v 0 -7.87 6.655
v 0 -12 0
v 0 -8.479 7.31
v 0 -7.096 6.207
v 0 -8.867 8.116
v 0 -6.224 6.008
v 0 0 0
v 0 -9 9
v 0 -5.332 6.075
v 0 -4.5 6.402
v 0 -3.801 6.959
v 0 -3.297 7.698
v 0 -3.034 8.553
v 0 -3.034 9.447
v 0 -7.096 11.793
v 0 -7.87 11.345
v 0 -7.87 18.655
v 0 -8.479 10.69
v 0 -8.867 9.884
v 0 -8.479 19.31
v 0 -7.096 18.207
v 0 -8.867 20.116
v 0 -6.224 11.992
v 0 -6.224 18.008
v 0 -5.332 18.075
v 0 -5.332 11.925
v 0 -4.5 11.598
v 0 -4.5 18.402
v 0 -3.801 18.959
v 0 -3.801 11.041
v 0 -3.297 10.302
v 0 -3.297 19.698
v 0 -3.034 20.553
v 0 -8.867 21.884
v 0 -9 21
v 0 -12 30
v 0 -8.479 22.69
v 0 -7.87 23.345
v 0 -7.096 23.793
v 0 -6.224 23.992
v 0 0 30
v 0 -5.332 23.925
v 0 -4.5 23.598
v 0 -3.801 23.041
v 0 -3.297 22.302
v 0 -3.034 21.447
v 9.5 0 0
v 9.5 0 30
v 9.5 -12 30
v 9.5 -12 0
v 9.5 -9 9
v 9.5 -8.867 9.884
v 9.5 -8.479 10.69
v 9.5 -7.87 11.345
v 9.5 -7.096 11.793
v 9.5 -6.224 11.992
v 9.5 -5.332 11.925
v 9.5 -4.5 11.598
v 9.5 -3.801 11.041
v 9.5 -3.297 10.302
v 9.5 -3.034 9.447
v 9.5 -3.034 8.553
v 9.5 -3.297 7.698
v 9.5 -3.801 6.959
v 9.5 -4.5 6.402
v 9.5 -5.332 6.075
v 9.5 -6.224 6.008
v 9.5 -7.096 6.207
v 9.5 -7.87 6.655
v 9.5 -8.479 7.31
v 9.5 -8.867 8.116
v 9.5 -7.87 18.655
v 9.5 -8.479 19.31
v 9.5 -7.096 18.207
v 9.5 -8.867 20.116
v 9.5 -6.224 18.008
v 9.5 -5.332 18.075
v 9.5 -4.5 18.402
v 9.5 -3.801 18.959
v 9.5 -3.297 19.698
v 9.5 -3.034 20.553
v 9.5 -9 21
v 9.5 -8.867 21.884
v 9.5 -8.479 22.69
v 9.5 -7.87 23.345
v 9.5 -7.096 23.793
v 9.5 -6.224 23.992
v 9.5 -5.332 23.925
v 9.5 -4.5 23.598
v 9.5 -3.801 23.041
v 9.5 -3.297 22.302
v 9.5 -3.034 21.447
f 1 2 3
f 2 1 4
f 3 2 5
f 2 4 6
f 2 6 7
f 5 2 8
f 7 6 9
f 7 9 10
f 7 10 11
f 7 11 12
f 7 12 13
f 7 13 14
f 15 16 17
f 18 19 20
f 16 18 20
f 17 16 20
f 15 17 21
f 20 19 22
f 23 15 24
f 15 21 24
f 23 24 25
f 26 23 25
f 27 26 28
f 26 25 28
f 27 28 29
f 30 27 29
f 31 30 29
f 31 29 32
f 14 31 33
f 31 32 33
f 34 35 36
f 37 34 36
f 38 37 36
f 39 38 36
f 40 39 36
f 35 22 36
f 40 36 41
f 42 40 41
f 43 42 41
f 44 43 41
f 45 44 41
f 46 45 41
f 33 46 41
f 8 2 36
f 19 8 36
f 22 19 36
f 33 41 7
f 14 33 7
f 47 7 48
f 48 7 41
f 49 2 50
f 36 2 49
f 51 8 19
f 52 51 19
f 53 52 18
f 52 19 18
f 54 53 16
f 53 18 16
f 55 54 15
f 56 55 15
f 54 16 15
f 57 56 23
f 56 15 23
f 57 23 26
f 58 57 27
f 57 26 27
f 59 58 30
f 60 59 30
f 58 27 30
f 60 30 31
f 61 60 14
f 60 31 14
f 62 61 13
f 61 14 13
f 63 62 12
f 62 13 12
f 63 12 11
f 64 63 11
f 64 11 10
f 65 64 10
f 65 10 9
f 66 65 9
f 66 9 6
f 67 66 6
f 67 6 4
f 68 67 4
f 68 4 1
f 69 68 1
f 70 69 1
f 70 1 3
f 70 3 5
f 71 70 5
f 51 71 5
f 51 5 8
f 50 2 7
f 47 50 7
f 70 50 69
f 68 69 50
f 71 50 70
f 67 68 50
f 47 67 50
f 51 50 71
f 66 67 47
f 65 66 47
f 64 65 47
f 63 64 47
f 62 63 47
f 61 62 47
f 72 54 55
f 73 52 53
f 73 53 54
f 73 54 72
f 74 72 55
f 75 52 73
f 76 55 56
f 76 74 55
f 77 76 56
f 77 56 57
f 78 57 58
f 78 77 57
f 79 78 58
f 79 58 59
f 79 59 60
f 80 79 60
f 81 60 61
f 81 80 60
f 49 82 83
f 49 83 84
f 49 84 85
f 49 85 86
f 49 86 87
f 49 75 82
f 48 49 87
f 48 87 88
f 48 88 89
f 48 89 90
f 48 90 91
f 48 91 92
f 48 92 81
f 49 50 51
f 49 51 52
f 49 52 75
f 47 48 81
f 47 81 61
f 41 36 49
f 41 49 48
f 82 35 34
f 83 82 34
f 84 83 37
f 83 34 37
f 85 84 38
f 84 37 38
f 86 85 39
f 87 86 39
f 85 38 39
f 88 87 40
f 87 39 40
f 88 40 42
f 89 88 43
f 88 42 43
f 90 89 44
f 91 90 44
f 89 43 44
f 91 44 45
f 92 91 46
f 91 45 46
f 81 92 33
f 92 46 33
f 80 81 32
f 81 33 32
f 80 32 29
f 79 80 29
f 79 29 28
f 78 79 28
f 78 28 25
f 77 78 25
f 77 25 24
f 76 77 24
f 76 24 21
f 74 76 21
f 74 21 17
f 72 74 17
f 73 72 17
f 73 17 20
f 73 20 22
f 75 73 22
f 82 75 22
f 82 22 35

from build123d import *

# Parameters (mm, degrees)
F0_W     = 12
F0_H     = 30
F1_DEPTH = 9.5
F3_D     = 6
F4_D     = 6


with BuildPart() as f1:
    # F0 (on Right) → F1 (new body)
    with BuildSketch(Plane.YZ):
        with Locations((-6, 15)):
            Rectangle(F0_W, F0_H)
    extrude(amount=F1_DEPTH)

    # F3 (through all)
    with Locations(Plane.YZ.offset(9.5)):
        with Locations((-6, 9)):
            Hole(F3_D / 2)

    # F4 (through all)
    with Locations(Plane.YZ.offset(9.5)):
        with Locations((-6, 21)):
            Hole(F4_D / 2)


solid = f1.part
